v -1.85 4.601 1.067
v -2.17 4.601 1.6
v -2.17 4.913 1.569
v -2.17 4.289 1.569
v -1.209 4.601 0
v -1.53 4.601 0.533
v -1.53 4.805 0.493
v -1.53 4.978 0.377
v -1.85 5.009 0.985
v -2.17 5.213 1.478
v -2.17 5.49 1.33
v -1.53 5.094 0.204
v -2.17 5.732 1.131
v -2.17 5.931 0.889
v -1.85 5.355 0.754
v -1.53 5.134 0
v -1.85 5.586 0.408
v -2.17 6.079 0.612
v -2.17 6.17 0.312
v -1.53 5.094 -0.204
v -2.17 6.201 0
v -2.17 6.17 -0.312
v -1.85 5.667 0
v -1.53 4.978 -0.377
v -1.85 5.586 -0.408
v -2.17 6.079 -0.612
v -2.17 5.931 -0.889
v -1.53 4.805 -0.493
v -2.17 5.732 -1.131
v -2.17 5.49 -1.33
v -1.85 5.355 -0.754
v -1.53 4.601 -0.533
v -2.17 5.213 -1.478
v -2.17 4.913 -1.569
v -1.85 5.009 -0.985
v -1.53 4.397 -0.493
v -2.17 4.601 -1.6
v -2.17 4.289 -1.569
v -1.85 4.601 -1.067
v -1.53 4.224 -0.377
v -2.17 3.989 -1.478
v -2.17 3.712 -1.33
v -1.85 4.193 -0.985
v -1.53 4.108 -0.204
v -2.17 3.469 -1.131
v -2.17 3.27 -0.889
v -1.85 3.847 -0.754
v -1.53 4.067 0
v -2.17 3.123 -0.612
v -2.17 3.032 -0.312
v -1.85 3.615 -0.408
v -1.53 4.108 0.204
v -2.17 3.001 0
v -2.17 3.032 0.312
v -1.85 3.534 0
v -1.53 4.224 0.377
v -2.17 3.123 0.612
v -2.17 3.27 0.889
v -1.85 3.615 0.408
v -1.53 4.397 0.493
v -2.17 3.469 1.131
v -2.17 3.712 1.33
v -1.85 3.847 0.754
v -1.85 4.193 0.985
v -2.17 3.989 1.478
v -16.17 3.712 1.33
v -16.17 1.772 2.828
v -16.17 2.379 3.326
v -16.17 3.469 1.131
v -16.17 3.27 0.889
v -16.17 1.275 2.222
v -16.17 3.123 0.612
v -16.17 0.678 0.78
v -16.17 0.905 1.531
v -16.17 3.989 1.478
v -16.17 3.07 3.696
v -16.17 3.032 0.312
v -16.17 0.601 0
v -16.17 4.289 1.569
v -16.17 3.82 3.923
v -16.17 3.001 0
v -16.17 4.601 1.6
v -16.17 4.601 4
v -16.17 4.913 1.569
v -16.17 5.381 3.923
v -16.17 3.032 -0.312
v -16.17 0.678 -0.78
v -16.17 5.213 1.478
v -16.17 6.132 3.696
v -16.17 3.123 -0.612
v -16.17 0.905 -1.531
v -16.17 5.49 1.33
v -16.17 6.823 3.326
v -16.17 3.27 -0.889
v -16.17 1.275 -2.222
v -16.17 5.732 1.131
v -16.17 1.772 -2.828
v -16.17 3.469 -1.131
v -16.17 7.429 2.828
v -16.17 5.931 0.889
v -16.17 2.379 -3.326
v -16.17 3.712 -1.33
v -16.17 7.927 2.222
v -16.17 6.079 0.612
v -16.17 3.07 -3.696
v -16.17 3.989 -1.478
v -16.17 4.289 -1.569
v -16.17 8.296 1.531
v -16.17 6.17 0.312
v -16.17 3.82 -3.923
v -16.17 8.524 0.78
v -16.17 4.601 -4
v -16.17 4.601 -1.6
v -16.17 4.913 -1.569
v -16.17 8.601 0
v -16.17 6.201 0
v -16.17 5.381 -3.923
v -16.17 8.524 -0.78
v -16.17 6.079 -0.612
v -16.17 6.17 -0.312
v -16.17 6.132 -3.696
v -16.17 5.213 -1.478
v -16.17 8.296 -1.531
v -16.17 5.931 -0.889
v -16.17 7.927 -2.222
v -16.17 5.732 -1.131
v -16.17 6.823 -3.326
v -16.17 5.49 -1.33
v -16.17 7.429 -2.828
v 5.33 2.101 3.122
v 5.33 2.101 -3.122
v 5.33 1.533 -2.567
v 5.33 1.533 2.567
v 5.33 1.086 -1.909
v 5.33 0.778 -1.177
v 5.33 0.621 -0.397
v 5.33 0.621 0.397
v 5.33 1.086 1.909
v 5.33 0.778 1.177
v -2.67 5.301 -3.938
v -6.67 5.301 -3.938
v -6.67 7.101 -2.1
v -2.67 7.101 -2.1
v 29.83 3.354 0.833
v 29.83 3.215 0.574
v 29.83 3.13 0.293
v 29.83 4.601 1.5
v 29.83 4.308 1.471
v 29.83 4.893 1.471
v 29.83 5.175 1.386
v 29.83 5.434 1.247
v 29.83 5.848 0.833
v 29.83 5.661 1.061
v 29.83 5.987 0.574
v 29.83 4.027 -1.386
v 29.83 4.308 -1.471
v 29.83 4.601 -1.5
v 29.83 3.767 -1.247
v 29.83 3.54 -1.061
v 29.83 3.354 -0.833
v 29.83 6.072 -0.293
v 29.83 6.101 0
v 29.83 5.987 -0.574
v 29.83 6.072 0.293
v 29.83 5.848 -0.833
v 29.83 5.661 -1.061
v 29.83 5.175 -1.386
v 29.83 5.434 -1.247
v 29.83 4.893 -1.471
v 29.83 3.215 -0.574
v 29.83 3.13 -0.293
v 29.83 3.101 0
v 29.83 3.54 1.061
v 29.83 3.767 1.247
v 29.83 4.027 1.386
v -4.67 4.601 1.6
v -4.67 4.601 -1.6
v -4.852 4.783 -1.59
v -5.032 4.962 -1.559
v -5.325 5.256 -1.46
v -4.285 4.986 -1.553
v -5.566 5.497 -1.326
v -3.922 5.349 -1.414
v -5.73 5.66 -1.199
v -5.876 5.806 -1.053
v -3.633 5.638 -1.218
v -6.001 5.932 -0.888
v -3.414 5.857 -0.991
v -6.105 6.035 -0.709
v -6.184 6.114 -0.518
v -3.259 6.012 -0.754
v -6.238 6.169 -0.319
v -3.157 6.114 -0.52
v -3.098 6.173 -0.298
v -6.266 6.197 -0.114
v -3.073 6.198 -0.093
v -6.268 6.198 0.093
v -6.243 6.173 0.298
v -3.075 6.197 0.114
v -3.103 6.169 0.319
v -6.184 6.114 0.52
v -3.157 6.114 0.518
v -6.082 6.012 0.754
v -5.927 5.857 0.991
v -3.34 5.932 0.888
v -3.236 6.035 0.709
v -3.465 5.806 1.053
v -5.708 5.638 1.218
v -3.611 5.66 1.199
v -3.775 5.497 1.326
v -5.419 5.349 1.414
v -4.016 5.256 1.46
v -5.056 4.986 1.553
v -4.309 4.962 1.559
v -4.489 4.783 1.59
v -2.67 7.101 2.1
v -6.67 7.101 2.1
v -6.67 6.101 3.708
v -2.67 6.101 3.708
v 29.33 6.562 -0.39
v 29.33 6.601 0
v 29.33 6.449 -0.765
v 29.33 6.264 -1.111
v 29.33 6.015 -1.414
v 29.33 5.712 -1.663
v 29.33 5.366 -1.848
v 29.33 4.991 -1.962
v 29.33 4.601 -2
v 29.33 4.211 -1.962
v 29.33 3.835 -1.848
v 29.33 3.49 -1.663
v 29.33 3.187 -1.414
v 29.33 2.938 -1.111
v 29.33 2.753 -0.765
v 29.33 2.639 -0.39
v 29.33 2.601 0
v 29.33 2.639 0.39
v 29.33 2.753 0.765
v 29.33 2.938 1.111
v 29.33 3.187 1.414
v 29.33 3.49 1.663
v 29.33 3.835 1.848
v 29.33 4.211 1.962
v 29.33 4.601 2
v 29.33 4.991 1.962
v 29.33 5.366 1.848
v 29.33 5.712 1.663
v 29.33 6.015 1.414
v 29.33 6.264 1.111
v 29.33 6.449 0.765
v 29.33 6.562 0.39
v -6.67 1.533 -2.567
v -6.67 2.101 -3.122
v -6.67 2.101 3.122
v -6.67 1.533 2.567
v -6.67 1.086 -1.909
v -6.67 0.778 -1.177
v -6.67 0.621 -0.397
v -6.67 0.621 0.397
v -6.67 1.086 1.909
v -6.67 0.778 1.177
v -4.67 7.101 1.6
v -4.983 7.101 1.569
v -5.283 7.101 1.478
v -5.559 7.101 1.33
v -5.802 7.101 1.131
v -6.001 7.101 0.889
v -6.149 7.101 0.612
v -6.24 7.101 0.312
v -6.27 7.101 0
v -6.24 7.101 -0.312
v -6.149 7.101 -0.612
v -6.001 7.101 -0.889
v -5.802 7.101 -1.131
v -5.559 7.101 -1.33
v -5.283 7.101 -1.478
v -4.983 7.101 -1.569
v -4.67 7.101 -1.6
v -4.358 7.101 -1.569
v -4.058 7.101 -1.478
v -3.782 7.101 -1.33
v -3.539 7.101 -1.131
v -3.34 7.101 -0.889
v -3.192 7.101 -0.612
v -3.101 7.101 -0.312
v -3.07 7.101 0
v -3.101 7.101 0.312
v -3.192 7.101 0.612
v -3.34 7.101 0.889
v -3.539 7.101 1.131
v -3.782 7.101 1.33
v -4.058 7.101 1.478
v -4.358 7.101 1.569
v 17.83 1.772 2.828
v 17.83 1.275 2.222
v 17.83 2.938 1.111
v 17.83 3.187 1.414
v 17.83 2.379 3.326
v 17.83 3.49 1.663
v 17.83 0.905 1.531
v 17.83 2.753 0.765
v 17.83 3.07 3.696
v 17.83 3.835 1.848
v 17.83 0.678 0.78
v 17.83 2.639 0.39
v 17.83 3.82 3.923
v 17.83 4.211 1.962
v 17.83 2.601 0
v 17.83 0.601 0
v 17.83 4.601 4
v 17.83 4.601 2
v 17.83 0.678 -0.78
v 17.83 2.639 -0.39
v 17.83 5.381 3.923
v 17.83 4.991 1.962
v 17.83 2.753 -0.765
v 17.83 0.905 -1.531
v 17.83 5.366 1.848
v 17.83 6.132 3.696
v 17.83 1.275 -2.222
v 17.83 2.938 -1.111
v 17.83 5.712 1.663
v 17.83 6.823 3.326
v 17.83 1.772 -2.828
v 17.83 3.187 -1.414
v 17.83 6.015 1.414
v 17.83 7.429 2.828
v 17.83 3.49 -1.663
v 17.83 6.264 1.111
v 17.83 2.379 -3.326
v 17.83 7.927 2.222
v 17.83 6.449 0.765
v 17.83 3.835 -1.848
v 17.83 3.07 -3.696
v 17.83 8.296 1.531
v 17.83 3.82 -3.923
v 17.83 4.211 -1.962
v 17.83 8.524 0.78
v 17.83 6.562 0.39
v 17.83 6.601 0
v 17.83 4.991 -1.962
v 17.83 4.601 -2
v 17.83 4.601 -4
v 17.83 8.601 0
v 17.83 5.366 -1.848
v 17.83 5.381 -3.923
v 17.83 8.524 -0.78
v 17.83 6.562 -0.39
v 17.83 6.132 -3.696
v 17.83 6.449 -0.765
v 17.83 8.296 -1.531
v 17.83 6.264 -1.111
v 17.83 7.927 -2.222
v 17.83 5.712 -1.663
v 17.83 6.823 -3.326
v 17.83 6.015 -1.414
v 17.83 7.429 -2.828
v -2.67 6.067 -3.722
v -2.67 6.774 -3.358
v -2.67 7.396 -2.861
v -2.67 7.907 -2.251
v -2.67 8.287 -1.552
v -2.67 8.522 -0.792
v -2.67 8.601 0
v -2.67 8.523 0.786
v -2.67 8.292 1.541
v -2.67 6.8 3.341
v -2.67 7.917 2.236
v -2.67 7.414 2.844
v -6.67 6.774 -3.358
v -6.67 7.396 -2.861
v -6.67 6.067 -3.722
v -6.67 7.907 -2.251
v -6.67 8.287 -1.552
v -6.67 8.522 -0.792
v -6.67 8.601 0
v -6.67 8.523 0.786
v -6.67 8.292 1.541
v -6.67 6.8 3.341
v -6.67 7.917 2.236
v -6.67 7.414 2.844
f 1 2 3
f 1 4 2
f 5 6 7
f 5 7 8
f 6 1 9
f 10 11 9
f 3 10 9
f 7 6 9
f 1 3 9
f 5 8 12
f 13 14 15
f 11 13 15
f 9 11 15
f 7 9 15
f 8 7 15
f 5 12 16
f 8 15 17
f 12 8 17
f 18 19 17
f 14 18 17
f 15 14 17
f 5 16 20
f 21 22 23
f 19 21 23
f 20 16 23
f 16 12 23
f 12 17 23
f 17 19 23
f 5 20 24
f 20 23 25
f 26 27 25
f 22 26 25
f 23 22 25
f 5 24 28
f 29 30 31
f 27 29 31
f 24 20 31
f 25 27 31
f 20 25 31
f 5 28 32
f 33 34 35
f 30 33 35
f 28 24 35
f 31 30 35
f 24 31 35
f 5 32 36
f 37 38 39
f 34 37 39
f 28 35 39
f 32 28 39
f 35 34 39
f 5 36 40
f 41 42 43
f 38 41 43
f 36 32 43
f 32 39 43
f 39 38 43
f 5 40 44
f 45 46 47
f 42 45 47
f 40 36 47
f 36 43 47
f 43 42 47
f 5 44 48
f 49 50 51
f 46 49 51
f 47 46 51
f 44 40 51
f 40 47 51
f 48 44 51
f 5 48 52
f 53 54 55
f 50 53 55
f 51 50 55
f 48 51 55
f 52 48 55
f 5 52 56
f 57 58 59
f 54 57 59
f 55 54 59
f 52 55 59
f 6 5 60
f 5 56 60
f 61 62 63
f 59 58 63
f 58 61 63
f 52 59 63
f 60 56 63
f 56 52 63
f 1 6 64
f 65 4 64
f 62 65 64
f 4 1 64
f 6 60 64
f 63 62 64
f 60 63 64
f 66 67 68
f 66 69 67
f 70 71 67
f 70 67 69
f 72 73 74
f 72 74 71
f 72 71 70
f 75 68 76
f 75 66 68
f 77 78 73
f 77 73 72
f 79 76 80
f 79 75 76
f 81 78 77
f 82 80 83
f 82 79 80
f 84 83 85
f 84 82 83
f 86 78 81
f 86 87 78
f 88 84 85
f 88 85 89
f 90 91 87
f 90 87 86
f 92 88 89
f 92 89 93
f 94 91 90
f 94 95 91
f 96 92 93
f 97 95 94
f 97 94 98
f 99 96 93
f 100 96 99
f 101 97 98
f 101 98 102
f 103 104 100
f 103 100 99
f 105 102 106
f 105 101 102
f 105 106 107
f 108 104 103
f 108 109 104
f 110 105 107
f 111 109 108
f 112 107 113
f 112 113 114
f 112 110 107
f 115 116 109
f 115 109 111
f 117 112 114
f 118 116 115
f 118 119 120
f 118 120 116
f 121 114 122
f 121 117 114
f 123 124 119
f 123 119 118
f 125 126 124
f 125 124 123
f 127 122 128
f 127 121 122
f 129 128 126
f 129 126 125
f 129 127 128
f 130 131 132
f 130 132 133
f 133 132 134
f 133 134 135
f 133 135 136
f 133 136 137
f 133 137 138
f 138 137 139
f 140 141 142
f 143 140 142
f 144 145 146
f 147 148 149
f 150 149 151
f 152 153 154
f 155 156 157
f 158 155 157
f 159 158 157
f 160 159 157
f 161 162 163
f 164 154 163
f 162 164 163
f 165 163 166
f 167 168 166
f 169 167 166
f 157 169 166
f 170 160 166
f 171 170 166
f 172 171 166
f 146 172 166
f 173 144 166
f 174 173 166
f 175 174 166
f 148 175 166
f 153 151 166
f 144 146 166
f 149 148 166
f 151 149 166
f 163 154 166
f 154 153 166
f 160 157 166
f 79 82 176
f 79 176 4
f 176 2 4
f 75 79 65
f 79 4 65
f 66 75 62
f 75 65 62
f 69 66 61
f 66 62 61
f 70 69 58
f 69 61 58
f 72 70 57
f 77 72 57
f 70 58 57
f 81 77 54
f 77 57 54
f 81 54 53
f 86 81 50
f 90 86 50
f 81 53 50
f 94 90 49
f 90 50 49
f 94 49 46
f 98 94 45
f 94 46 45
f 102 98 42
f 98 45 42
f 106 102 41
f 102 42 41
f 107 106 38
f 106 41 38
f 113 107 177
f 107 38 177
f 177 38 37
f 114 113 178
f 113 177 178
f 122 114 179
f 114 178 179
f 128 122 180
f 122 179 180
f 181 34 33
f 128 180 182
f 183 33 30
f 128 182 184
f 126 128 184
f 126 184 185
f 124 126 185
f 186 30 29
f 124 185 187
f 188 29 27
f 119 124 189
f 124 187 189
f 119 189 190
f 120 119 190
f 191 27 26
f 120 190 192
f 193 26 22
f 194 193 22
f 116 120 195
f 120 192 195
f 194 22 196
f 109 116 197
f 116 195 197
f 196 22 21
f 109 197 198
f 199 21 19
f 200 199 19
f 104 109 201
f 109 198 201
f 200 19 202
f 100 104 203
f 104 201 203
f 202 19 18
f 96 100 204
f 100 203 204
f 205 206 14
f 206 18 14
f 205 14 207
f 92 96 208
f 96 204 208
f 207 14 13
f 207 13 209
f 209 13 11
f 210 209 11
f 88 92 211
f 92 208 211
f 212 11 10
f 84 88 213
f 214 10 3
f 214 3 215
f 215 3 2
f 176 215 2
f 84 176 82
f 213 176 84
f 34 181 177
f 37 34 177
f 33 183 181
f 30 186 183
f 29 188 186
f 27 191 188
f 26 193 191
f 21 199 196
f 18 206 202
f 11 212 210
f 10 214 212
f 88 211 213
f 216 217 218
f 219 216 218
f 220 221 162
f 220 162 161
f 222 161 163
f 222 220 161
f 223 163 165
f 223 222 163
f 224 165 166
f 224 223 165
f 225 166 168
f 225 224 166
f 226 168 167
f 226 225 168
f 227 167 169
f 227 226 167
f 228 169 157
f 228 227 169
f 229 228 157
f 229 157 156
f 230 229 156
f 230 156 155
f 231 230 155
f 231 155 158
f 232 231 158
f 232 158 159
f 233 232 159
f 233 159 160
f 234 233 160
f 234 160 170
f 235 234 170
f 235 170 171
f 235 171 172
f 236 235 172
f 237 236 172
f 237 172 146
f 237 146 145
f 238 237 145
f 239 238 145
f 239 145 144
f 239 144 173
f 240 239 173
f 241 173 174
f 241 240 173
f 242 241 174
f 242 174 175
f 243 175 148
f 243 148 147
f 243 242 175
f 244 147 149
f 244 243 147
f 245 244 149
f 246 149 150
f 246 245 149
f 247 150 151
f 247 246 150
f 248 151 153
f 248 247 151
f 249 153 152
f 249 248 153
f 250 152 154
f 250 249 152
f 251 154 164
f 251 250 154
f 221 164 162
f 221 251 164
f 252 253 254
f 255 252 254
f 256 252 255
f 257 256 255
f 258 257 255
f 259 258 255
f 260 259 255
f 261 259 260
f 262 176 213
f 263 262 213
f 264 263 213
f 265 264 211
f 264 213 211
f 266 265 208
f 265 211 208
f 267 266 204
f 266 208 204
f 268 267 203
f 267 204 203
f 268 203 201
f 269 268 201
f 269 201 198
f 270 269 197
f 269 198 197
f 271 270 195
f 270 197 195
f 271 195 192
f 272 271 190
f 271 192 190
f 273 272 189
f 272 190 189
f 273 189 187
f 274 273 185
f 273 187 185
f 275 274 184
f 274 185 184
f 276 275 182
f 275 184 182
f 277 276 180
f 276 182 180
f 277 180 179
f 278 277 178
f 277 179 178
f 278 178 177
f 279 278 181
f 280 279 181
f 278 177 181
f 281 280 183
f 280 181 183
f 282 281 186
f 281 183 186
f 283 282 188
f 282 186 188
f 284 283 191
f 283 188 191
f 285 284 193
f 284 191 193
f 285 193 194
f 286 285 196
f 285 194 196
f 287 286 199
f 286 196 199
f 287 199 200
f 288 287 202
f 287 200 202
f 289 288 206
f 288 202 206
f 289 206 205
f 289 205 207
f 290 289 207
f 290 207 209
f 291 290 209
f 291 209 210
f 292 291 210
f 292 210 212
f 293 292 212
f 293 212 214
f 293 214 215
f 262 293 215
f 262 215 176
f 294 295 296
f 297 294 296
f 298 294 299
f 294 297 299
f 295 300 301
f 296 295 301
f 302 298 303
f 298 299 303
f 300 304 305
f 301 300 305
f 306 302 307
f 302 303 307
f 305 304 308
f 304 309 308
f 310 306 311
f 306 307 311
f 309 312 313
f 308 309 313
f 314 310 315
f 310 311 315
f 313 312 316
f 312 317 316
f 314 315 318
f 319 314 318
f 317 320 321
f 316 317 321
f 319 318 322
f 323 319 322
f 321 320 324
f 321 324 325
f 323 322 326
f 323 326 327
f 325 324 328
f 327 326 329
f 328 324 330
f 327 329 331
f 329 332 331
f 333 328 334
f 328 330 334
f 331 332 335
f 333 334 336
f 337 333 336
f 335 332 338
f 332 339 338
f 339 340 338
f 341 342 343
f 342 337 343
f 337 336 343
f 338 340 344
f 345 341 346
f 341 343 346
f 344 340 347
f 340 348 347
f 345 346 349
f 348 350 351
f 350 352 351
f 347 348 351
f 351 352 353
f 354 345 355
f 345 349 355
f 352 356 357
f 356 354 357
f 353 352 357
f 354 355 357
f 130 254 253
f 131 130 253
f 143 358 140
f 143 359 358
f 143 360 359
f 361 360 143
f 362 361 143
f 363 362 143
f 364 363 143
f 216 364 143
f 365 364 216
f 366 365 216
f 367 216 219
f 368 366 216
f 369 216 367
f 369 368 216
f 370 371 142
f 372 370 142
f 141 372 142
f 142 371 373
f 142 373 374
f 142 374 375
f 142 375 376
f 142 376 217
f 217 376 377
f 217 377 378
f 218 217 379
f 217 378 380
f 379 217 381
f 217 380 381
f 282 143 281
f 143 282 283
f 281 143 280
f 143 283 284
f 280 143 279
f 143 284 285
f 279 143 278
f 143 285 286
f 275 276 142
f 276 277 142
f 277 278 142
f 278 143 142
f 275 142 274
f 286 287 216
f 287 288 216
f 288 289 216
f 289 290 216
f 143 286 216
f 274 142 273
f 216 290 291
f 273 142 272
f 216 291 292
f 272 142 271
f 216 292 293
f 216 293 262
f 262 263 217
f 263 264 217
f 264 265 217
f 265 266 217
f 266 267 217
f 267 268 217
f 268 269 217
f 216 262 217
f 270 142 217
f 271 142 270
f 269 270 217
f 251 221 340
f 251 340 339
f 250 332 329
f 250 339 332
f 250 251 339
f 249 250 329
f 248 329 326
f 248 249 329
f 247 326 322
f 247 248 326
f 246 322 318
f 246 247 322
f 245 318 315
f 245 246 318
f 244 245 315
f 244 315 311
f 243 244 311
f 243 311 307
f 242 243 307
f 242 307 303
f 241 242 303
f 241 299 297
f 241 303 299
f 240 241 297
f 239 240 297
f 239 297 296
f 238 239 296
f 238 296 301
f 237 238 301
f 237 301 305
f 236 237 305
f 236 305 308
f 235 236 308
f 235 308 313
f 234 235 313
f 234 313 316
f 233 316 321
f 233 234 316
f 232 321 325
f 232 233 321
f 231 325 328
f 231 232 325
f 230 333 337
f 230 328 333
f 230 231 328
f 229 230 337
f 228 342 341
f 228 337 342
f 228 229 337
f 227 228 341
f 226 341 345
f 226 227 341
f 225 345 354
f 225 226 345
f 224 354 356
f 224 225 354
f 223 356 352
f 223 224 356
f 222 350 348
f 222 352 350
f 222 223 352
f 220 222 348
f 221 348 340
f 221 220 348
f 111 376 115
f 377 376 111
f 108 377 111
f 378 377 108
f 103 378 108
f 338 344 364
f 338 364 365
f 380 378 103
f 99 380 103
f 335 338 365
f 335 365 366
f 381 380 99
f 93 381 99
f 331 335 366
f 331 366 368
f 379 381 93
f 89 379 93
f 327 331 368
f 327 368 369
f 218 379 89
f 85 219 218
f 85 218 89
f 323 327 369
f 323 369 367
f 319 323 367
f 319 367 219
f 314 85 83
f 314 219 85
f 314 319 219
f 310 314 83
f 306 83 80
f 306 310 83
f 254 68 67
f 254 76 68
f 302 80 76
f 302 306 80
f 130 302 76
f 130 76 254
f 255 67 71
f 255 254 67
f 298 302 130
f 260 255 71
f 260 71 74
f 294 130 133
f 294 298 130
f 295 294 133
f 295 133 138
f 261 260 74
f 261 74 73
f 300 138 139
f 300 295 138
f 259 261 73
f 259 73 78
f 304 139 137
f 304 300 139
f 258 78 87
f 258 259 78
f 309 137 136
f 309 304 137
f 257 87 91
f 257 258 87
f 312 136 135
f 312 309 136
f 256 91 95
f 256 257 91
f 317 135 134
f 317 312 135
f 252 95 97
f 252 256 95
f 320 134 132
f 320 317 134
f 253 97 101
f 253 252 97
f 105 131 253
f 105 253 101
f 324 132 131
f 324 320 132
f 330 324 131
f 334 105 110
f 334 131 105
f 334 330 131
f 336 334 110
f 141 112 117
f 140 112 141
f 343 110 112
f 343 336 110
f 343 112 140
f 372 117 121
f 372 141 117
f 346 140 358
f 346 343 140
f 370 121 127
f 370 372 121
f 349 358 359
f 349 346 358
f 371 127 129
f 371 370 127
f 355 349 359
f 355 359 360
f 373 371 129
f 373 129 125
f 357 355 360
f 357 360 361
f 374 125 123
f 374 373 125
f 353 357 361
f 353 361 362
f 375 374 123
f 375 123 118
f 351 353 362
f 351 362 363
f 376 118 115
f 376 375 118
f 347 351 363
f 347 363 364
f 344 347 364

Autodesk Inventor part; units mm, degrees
ref_plane "YZ Ebene" through (0, 0, 0) normal (1, 0, 0) x (0, 1, 0)
sketch "Skizze1" plane through (0, 0, 0) normal (0, 0, 1) x (1, 0, 0)
  line L0 (-16.1705, 4.6008) -> (-16.1705, 8.6008)
  line L1 (-16.1705, 8.6008) -> (17.8295, 8.6008)
  line L2 (17.8295, 8.6008) -> (17.8295, 6.6008)
  line L3 (17.8295, 6.6008) -> (29.8295, 6.6008)
  line L4 (29.8295, 6.6008) -> (29.8295, 4.6008)
  line L5 (29.8295, 4.6008) -> (-16.1705, 4.6008)
  dimension "d0" = 46
  dimension "d1" = 12
  dimension "d2" = 4
  dimension "d3" = 8
revolve "Grundkörper" add sketch "Skizze1" angle 360 about axis through (29.8295, 4.6008, 0) along (-1, 0, 0)
sketch "Skizze2" plane through (-16.1705, 4.6008, 0) normal (-1, 0, 0) x (0, 0, 1)
  circle A0 centre (0, 0) radius 4 projected
hole "3,2 Bohrung axial" at (-16.1705, 4.6008, 0) direction (1, 0, 0) diameter 3.2 depth 14 tip angle 118
chamfer "Fase 0,5x45" distance 0.5 angle 45 1 edges at (29.8295, 2.6008, 0)
ref_plane "Arbeitsebene1" through (0.8295, 8.6008, 0) normal (0, 1, 0) x (-1, 0, 0)
sketch "Skizze3" plane through (0.8295, 8.6008, 0) normal (0, 1, 0) x (-1, 0, 0)
  line L0 (17, 4) -> (17, -4) projected
  point P0 (5.5, 0)
  dimension "d14" = 11.5
hole "3,2 Bohrung radial" at (-4.6705, 8.6008, 0) direction (0, -1, 0) diameter 3.2 end up to surface
ref_plane "Arbeitsebene2" through (-6.6705, 4.6008, 0) normal (-1, 0, 0) x (0, 0, 1)
sketch "Skizze5" plane through (-6.6705, 4.6008, 0) normal (-1, 0, 0) x (0, 0, 1)
  line L0 (-1.6, 0) -> (-1.6, 3.6661) projected
  circle A0 centre (0, 0) radius 4 projected
  line L1 (1.6, 0) -> (1.6, 3.6661) projected
  line L2 (-3.9383, 0.7) -> (-2.1, 2.5)
  line L3 (-2.1, 2.5) -> (2.1, 2.5)
  line L4 (2.1, 2.5) -> (3.7081, 1.5)
  line L5 (3.1225, -2.5) -> (-3.1225, -2.5)
  line L6 (0, -4) -> (0, 4) construction
  dimension "d31" = 1.5
  dimension "d32" = 4
  dimension "d33" = 3.2
  dimension "d34" = 5
  dimension "d35" = 0.5
  dimension "d36" = 0.5
extrude "Entlüftungssteuerschlitz" cut sketch "Skizze5" against normal blind 4 contours L3 L2 A0 L0 | L0 A0 L1 L3 | L1 A0 L4 L3
extrude "Belüftungssteuerschlitz" cut sketch "Skizze5" against normal blind 12 contours L5 A0
properties part number "Kurbelwelle" material "CuZn40"
